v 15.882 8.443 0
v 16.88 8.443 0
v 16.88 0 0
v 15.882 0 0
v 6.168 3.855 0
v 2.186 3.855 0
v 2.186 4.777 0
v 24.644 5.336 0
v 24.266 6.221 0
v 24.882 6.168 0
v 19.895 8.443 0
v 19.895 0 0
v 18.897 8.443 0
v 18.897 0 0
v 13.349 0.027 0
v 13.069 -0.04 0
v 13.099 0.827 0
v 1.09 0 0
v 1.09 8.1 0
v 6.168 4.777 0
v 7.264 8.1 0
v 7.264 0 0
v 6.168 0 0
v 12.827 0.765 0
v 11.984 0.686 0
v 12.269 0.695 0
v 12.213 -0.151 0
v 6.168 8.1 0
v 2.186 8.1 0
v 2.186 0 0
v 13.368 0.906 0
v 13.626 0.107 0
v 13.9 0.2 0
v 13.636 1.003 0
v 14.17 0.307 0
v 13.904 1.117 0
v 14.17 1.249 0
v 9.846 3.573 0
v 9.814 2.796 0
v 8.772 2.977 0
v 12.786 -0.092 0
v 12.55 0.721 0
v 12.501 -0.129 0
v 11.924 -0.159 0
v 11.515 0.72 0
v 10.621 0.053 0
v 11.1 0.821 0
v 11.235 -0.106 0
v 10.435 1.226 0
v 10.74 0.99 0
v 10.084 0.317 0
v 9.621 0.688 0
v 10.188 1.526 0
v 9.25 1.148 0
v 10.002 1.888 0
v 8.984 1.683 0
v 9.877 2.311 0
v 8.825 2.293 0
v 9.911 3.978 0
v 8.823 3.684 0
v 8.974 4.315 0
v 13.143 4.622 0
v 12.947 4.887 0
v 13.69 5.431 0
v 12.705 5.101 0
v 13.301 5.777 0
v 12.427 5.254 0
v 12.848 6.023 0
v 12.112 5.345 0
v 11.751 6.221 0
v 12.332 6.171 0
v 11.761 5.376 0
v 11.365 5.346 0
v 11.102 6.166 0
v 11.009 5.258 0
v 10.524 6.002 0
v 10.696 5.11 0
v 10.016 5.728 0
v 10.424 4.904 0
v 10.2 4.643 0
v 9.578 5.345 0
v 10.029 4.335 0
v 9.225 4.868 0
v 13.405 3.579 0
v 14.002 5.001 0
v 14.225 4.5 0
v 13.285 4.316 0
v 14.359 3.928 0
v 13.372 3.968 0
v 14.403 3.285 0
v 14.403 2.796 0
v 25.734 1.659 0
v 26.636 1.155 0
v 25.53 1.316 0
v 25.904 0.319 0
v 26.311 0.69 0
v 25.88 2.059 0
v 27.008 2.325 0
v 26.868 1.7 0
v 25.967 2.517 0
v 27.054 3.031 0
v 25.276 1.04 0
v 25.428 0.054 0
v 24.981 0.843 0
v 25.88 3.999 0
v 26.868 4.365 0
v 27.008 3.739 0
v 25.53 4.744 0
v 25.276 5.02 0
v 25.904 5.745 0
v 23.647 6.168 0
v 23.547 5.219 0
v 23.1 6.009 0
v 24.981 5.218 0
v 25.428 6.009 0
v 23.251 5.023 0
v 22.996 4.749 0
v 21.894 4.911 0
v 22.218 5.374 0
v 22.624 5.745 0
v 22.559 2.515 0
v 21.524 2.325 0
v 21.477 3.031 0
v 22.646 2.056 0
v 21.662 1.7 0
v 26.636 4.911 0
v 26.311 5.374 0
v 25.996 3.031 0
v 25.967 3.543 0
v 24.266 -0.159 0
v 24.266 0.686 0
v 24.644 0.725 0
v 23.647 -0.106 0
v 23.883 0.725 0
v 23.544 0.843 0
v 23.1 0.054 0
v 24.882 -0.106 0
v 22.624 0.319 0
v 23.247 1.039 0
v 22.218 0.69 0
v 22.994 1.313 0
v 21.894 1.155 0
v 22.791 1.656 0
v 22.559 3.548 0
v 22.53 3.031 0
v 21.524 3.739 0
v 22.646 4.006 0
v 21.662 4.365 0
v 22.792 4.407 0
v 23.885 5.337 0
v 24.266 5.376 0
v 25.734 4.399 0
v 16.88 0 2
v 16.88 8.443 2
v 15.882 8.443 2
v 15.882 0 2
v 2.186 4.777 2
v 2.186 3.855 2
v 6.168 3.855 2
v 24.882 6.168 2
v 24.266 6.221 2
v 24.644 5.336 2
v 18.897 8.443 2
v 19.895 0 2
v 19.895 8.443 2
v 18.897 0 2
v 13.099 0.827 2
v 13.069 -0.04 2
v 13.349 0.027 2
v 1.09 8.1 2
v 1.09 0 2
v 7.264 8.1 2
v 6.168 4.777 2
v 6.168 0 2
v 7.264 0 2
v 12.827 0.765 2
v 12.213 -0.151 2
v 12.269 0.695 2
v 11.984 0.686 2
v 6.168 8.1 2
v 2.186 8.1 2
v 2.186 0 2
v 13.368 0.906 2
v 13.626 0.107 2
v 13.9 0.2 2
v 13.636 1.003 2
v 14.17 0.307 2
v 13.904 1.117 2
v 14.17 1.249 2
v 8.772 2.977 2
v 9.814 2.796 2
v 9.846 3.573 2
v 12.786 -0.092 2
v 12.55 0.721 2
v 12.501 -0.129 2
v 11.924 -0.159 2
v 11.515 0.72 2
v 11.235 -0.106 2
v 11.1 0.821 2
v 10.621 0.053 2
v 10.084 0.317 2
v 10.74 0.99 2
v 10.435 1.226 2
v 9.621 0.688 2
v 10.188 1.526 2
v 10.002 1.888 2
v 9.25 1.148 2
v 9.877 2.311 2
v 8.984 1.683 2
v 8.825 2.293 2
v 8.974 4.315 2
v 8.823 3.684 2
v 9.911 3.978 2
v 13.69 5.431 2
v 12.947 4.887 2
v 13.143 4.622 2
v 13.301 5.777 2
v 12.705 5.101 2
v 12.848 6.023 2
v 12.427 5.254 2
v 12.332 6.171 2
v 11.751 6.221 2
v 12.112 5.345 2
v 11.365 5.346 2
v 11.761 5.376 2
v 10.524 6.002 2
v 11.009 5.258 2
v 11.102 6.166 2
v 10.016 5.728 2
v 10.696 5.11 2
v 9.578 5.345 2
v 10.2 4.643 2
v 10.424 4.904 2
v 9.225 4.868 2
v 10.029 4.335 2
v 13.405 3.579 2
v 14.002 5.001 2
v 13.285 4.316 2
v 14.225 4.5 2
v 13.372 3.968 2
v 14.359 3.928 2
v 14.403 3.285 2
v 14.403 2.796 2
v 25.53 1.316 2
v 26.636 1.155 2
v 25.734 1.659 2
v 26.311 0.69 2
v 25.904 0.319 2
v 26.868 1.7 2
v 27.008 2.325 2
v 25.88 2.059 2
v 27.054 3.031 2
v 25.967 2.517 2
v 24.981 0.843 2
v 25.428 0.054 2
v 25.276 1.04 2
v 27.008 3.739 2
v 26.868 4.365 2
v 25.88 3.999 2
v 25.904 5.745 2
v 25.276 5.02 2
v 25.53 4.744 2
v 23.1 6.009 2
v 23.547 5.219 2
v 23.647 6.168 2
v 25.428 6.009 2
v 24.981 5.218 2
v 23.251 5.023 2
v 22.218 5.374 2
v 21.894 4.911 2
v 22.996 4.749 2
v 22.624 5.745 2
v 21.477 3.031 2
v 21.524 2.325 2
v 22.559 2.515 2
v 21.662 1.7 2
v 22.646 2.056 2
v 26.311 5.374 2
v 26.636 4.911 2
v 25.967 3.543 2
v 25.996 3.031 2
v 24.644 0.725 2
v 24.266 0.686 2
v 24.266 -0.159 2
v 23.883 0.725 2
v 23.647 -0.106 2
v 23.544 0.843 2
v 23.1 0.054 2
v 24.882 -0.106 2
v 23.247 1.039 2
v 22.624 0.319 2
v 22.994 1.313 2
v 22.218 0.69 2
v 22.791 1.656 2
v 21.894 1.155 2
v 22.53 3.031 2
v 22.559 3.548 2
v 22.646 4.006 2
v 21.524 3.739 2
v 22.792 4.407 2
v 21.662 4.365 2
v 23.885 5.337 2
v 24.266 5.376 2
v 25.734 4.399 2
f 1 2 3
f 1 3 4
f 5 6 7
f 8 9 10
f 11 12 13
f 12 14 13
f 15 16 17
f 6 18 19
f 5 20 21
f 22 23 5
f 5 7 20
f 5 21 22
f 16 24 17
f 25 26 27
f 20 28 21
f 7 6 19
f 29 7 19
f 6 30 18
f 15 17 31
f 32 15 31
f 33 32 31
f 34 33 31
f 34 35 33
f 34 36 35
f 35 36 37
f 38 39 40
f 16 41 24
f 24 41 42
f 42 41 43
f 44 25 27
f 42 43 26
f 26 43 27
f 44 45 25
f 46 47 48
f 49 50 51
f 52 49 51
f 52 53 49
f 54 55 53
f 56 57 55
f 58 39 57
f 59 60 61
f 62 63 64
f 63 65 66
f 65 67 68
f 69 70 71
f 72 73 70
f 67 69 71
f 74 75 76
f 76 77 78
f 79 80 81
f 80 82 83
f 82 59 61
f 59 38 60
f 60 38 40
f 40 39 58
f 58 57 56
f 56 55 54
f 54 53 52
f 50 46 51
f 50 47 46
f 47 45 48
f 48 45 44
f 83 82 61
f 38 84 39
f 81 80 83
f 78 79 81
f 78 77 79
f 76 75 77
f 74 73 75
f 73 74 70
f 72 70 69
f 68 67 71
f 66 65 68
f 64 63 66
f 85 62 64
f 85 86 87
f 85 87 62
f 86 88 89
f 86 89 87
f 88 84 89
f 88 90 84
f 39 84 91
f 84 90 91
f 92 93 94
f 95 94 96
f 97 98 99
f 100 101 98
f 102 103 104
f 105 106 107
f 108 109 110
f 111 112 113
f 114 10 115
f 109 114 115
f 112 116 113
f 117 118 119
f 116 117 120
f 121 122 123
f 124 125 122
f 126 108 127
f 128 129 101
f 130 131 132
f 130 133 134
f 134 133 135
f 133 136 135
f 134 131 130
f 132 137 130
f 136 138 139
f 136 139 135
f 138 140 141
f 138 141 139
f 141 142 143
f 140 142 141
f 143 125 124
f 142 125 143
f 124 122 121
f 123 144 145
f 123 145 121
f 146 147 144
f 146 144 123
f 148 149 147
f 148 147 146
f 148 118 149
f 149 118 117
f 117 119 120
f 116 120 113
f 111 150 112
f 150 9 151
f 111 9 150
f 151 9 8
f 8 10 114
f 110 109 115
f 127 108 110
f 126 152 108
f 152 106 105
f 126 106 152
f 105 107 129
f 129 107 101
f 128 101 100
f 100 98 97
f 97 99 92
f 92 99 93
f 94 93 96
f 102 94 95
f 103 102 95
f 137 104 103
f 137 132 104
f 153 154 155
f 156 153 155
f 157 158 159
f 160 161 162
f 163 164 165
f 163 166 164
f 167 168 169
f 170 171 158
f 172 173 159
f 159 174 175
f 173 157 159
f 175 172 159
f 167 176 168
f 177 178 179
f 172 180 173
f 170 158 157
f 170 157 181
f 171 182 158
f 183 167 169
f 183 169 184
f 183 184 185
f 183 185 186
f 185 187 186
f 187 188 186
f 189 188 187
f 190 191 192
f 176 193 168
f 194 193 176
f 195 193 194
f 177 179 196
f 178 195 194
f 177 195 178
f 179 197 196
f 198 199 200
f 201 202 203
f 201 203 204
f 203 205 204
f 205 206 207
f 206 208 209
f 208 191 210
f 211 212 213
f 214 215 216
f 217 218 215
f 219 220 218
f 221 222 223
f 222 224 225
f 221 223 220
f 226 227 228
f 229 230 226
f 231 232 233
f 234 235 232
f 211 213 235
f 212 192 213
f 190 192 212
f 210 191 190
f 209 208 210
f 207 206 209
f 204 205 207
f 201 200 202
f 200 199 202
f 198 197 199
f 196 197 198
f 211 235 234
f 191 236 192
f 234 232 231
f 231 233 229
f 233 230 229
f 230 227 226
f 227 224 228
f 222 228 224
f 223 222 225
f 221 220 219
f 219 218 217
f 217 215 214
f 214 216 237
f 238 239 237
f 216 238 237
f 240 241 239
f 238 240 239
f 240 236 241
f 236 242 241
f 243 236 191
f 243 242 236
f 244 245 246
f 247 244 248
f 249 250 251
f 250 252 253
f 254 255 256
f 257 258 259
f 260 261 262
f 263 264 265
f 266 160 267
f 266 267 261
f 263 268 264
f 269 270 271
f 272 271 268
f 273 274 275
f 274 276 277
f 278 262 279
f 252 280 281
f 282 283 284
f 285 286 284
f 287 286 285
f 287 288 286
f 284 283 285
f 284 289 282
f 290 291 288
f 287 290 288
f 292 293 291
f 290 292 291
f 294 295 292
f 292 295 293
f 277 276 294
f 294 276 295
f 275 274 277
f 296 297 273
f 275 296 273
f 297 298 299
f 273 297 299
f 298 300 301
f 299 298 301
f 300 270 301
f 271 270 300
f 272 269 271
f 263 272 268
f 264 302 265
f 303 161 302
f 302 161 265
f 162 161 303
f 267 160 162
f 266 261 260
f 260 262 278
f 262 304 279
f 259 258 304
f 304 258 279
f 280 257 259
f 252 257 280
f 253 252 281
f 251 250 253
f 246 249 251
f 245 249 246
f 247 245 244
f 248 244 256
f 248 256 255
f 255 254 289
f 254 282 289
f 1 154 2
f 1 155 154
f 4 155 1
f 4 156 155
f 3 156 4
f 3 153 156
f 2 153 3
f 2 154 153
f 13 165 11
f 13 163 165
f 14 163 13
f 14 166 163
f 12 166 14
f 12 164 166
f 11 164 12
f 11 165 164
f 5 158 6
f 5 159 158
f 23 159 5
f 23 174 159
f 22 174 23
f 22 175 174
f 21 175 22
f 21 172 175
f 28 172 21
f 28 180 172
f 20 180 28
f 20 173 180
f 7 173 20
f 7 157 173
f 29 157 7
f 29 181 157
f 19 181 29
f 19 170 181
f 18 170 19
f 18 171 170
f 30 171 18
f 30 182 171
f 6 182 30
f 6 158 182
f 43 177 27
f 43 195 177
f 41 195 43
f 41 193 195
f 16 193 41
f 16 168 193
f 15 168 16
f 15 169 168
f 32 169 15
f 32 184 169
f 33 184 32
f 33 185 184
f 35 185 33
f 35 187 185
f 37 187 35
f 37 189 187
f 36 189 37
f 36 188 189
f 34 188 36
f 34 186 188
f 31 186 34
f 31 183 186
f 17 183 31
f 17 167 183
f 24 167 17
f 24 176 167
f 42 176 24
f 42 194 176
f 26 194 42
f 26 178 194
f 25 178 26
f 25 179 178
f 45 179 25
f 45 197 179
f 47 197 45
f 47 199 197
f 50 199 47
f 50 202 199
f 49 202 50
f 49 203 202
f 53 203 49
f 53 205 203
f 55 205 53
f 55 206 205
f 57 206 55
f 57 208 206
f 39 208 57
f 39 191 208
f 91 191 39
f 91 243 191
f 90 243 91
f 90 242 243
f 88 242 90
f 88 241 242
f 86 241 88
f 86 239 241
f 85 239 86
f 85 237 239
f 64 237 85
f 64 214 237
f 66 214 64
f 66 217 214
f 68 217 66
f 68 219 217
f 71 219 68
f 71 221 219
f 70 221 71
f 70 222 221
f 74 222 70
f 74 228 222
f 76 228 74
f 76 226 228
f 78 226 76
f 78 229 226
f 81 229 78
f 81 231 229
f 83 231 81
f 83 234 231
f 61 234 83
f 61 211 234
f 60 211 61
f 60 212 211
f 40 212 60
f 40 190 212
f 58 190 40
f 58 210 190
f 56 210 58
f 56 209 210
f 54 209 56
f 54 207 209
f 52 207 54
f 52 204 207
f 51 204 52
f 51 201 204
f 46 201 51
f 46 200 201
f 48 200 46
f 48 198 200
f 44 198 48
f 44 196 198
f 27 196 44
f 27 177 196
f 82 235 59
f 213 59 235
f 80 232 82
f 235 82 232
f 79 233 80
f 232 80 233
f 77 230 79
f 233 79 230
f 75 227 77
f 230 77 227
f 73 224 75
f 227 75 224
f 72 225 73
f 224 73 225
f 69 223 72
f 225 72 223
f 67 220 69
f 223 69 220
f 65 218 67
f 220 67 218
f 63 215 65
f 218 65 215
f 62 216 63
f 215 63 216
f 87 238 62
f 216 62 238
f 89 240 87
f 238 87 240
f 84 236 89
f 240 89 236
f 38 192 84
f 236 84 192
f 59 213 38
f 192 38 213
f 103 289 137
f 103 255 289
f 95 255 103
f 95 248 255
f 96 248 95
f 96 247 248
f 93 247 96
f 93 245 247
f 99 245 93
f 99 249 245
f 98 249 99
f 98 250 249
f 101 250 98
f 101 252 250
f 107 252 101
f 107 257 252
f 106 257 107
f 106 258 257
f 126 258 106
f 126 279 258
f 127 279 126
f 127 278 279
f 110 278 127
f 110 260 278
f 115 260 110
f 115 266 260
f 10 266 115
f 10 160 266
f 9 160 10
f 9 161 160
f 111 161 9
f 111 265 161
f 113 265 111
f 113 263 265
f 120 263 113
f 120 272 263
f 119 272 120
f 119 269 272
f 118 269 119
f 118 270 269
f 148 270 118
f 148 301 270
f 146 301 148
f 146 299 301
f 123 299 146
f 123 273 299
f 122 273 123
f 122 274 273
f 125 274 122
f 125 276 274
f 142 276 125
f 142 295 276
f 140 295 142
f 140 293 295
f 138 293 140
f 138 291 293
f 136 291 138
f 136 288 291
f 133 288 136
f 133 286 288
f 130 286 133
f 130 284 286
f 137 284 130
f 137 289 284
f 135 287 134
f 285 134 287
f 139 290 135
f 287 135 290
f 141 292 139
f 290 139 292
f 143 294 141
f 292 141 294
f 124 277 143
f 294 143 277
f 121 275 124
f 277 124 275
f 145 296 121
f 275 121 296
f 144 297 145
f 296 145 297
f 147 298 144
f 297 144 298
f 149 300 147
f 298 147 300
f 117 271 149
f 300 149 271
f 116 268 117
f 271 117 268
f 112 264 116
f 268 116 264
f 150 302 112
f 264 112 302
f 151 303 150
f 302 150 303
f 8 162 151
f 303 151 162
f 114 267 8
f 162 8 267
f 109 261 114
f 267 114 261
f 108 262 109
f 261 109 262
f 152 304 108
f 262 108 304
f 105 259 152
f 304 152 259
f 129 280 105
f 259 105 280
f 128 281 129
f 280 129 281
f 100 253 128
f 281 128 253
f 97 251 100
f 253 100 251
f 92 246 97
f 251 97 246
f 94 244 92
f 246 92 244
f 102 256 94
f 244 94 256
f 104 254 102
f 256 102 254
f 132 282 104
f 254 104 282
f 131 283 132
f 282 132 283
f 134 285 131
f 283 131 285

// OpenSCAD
// expect: the text uses Liberation Sans instead, which looks a little different
linear_extrude(2) text("Hello", size = 8, font = "Verdana");
